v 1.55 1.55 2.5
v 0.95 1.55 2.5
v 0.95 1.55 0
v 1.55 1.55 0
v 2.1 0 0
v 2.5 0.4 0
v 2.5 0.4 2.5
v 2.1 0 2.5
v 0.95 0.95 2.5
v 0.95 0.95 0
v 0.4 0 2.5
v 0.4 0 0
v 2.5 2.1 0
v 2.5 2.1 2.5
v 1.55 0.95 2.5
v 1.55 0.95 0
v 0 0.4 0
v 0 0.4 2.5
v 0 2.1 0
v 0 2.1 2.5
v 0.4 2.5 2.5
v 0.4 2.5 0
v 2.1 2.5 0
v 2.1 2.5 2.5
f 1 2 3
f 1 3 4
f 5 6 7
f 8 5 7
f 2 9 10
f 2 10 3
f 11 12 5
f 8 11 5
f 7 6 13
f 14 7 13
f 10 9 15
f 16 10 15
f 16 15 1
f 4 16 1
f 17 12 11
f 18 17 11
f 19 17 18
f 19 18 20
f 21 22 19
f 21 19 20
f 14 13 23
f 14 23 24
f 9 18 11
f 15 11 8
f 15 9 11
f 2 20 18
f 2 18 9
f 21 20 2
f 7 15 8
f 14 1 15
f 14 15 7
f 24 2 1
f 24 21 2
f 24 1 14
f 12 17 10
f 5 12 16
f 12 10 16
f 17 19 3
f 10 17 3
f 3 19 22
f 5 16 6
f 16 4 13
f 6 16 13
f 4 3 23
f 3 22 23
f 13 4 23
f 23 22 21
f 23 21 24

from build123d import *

# Parameters (mm, degrees)
F0_W     = 2.5
F0_H     = 2.5
F1_DEPTH = 2.5
F2_W     = 0.6
F2_H     = 0.6
F3_DEPTH = 25
F4_SIZE  = 0.4


with BuildPart() as f1:
    # F0 (on Top) → F1 (new body)
    with BuildSketch(Plane.XY):
        with Locations((1.25, 1.25)):
            Rectangle(F0_W, F0_H)
    extrude(amount=F1_DEPTH)

    # F2 (on face) → F3 (cut)
    with BuildSketch(Plane.XY.offset(2.5)):
        with Locations((1.25, 1.25)):
            Rectangle(F2_W, F2_H)
    extrude(amount=-F3_DEPTH, mode=Mode.SUBTRACT)

    # F4
    f4_edges = [f1.edges().sort_by_distance(p)[0] for p in [
        (0, 0, 1.25),
        (2.5, 0, 1.25),
        (2.5, 2.5, 1.25),
        (0, 2.5, 1.25),
    ]]
    chamfer(f4_edges, length=F4_SIZE)


solid = f1.part
